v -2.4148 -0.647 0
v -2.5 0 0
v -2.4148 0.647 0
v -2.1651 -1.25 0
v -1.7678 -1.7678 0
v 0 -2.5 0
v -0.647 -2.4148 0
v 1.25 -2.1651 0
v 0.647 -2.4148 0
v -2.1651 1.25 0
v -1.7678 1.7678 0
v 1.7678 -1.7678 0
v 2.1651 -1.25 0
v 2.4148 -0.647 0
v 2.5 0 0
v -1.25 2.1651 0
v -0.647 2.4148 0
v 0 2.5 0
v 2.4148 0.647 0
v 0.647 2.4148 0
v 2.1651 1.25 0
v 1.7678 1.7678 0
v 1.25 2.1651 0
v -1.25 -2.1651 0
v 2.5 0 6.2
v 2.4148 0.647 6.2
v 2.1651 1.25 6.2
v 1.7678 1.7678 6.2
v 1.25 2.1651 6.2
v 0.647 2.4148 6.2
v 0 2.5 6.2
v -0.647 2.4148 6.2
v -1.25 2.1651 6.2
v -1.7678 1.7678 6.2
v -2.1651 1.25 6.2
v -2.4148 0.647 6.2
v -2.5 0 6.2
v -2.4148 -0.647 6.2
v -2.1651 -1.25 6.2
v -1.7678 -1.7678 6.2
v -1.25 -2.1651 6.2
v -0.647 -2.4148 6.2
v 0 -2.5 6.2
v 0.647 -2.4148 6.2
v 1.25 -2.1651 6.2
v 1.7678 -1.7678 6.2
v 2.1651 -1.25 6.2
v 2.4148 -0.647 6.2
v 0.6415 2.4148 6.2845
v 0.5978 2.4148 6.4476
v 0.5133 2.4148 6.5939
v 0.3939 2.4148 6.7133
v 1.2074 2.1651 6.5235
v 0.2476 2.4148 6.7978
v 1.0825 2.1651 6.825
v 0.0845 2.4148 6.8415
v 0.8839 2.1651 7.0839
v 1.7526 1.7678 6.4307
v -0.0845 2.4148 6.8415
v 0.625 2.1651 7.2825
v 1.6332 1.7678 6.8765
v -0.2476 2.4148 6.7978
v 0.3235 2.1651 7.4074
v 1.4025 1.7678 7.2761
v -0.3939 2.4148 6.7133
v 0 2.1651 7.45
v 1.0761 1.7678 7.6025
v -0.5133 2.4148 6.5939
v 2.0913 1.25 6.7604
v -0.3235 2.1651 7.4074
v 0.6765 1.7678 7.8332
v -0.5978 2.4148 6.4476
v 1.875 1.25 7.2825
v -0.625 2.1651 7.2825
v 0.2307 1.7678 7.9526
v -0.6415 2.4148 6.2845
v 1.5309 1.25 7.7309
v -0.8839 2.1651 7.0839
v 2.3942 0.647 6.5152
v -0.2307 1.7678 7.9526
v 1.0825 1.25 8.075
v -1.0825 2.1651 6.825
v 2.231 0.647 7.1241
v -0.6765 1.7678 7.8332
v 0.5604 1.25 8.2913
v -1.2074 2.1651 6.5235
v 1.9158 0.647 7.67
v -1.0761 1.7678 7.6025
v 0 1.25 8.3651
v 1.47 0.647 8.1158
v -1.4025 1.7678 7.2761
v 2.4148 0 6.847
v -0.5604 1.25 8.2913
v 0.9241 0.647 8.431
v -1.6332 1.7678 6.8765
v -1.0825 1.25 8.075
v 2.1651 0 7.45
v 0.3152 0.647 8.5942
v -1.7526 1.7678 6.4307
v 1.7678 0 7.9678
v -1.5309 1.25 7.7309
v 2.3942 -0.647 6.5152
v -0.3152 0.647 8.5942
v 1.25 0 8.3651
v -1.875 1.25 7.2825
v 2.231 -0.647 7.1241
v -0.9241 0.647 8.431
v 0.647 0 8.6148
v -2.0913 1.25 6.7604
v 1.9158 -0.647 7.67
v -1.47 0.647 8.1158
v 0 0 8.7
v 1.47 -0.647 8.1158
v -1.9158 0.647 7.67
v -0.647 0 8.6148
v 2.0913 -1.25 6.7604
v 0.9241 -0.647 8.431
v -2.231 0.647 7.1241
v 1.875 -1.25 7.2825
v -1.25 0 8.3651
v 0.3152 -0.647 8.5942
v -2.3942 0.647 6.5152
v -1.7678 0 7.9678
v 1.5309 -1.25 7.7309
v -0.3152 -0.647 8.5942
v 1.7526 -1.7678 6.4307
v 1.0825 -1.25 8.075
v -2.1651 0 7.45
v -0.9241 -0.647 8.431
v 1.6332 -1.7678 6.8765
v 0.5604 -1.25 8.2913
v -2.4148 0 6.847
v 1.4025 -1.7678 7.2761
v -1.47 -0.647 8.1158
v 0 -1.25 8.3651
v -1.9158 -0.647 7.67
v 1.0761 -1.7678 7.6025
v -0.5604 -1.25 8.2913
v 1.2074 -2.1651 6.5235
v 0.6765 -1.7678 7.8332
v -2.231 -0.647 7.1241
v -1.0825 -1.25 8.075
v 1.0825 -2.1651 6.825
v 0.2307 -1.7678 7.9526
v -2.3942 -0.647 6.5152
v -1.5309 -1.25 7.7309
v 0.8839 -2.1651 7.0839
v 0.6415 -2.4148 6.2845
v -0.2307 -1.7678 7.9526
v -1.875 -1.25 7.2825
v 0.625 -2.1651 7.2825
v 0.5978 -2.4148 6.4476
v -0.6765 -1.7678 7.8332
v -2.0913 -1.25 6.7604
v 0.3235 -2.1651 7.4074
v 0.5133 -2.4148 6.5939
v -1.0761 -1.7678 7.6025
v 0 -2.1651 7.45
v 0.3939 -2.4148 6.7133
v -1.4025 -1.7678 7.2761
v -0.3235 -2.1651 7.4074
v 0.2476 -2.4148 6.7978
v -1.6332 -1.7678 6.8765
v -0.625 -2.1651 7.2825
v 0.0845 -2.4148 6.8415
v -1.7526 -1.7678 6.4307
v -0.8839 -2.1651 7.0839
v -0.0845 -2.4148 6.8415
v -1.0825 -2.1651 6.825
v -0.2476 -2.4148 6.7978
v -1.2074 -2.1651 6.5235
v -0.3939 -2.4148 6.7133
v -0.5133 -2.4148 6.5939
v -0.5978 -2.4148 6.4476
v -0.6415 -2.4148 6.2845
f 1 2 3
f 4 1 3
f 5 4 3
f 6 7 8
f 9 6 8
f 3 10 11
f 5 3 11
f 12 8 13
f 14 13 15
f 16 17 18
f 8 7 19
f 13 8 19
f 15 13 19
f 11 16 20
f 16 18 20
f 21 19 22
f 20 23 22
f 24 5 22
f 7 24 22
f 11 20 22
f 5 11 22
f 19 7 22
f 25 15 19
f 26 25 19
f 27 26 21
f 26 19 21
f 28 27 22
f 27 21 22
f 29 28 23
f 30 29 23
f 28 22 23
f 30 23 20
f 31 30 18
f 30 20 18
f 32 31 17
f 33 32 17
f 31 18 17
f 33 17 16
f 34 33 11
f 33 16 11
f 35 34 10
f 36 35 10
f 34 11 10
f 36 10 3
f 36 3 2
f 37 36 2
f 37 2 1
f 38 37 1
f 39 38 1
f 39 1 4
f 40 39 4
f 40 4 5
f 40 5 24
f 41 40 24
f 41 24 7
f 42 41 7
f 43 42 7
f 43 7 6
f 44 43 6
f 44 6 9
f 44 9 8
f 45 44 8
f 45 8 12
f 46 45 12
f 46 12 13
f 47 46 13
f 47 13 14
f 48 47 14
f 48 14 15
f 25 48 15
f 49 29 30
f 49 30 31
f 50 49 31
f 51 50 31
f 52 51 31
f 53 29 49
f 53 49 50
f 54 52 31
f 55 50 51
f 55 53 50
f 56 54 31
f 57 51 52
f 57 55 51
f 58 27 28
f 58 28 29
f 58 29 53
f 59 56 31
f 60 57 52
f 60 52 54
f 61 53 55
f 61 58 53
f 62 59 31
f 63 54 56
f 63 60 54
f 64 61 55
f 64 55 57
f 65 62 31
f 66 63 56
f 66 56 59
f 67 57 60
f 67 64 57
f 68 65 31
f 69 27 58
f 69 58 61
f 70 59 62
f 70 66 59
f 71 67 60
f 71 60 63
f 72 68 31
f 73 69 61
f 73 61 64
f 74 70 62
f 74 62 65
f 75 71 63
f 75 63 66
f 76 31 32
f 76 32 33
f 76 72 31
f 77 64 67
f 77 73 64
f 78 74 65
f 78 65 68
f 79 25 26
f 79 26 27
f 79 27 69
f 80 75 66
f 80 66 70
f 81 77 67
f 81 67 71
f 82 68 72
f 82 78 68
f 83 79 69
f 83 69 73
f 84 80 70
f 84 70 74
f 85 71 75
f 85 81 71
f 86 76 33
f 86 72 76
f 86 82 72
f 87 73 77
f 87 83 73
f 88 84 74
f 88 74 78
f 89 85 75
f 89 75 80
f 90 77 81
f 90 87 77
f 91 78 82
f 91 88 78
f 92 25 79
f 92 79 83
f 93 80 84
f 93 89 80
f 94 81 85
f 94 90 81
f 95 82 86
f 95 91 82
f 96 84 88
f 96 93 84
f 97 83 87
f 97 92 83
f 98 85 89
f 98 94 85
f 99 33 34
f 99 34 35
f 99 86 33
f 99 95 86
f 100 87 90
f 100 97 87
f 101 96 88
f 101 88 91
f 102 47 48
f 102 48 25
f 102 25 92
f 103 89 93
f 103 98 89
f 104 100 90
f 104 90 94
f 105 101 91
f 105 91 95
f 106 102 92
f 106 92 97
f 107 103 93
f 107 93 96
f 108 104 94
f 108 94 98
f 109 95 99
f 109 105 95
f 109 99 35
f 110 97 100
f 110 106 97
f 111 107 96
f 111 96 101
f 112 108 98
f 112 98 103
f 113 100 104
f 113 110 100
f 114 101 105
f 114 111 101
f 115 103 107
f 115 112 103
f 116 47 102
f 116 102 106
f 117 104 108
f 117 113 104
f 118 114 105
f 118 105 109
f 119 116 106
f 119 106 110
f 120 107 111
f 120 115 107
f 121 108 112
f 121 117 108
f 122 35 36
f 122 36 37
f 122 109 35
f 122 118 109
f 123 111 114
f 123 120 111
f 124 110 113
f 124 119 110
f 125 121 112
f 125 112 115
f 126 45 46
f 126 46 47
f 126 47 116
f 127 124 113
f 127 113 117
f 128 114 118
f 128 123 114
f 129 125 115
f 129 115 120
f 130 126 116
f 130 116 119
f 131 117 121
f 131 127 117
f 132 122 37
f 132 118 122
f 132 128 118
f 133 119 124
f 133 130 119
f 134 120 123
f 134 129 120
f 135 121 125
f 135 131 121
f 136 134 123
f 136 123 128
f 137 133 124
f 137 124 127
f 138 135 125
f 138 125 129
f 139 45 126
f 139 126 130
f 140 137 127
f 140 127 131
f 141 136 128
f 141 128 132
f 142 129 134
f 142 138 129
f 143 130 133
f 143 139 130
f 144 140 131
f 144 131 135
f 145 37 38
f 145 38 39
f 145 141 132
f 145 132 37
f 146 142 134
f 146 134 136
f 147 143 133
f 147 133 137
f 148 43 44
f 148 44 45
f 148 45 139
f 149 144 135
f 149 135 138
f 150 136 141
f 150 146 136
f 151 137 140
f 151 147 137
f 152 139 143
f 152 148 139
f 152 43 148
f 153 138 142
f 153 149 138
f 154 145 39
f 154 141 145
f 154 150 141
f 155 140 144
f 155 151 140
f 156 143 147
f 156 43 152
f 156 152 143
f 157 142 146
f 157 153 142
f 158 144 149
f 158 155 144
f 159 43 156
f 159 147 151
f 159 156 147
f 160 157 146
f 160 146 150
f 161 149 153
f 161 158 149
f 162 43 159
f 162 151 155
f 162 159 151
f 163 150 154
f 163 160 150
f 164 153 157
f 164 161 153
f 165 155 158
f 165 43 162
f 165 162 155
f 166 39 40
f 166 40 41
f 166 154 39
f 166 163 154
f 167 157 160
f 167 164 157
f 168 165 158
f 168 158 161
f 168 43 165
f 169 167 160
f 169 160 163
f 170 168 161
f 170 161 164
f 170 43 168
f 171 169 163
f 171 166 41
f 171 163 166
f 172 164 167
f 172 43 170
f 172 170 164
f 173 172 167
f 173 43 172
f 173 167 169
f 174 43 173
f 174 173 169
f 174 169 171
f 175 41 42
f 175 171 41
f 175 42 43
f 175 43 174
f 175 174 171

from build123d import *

# Parameters (mm, degrees)
SPHERE_ANGLE      = 180
CYLINDER184_R     = 2.5
CYLINDER184_DEPTH = 6.2


with BuildPart() as vd2_body_sphere:
    # Sphere → Sphere (revolve)
    with BuildSketch(Plane(origin=(0, 0, 6.2), x_dir=(1, 0, 0), z_dir=(0, 0, -1))):
        with BuildLine():
            ThreePointArc((0, -2.5), (2.5, 0), (0, 2.5))
            Line((0, 2.5), (0, -2.5))
        make_face()
    revolve(axis=Axis((0, 0, 6.2), (0, -1, 0)), revolution_arc=SPHERE_ANGLE)


with BuildPart() as vd2_body:
    # Cylinder184 → Cylinder184 (new body)
    with BuildSketch(Plane.XY):
        Circle(CYLINDER184_R)
    extrude(amount=CYLINDER184_DEPTH)

    # Fusion005: union VD2_Body_Sphere
    add(vd2_body_sphere.part)


solid = vd2_body.part
